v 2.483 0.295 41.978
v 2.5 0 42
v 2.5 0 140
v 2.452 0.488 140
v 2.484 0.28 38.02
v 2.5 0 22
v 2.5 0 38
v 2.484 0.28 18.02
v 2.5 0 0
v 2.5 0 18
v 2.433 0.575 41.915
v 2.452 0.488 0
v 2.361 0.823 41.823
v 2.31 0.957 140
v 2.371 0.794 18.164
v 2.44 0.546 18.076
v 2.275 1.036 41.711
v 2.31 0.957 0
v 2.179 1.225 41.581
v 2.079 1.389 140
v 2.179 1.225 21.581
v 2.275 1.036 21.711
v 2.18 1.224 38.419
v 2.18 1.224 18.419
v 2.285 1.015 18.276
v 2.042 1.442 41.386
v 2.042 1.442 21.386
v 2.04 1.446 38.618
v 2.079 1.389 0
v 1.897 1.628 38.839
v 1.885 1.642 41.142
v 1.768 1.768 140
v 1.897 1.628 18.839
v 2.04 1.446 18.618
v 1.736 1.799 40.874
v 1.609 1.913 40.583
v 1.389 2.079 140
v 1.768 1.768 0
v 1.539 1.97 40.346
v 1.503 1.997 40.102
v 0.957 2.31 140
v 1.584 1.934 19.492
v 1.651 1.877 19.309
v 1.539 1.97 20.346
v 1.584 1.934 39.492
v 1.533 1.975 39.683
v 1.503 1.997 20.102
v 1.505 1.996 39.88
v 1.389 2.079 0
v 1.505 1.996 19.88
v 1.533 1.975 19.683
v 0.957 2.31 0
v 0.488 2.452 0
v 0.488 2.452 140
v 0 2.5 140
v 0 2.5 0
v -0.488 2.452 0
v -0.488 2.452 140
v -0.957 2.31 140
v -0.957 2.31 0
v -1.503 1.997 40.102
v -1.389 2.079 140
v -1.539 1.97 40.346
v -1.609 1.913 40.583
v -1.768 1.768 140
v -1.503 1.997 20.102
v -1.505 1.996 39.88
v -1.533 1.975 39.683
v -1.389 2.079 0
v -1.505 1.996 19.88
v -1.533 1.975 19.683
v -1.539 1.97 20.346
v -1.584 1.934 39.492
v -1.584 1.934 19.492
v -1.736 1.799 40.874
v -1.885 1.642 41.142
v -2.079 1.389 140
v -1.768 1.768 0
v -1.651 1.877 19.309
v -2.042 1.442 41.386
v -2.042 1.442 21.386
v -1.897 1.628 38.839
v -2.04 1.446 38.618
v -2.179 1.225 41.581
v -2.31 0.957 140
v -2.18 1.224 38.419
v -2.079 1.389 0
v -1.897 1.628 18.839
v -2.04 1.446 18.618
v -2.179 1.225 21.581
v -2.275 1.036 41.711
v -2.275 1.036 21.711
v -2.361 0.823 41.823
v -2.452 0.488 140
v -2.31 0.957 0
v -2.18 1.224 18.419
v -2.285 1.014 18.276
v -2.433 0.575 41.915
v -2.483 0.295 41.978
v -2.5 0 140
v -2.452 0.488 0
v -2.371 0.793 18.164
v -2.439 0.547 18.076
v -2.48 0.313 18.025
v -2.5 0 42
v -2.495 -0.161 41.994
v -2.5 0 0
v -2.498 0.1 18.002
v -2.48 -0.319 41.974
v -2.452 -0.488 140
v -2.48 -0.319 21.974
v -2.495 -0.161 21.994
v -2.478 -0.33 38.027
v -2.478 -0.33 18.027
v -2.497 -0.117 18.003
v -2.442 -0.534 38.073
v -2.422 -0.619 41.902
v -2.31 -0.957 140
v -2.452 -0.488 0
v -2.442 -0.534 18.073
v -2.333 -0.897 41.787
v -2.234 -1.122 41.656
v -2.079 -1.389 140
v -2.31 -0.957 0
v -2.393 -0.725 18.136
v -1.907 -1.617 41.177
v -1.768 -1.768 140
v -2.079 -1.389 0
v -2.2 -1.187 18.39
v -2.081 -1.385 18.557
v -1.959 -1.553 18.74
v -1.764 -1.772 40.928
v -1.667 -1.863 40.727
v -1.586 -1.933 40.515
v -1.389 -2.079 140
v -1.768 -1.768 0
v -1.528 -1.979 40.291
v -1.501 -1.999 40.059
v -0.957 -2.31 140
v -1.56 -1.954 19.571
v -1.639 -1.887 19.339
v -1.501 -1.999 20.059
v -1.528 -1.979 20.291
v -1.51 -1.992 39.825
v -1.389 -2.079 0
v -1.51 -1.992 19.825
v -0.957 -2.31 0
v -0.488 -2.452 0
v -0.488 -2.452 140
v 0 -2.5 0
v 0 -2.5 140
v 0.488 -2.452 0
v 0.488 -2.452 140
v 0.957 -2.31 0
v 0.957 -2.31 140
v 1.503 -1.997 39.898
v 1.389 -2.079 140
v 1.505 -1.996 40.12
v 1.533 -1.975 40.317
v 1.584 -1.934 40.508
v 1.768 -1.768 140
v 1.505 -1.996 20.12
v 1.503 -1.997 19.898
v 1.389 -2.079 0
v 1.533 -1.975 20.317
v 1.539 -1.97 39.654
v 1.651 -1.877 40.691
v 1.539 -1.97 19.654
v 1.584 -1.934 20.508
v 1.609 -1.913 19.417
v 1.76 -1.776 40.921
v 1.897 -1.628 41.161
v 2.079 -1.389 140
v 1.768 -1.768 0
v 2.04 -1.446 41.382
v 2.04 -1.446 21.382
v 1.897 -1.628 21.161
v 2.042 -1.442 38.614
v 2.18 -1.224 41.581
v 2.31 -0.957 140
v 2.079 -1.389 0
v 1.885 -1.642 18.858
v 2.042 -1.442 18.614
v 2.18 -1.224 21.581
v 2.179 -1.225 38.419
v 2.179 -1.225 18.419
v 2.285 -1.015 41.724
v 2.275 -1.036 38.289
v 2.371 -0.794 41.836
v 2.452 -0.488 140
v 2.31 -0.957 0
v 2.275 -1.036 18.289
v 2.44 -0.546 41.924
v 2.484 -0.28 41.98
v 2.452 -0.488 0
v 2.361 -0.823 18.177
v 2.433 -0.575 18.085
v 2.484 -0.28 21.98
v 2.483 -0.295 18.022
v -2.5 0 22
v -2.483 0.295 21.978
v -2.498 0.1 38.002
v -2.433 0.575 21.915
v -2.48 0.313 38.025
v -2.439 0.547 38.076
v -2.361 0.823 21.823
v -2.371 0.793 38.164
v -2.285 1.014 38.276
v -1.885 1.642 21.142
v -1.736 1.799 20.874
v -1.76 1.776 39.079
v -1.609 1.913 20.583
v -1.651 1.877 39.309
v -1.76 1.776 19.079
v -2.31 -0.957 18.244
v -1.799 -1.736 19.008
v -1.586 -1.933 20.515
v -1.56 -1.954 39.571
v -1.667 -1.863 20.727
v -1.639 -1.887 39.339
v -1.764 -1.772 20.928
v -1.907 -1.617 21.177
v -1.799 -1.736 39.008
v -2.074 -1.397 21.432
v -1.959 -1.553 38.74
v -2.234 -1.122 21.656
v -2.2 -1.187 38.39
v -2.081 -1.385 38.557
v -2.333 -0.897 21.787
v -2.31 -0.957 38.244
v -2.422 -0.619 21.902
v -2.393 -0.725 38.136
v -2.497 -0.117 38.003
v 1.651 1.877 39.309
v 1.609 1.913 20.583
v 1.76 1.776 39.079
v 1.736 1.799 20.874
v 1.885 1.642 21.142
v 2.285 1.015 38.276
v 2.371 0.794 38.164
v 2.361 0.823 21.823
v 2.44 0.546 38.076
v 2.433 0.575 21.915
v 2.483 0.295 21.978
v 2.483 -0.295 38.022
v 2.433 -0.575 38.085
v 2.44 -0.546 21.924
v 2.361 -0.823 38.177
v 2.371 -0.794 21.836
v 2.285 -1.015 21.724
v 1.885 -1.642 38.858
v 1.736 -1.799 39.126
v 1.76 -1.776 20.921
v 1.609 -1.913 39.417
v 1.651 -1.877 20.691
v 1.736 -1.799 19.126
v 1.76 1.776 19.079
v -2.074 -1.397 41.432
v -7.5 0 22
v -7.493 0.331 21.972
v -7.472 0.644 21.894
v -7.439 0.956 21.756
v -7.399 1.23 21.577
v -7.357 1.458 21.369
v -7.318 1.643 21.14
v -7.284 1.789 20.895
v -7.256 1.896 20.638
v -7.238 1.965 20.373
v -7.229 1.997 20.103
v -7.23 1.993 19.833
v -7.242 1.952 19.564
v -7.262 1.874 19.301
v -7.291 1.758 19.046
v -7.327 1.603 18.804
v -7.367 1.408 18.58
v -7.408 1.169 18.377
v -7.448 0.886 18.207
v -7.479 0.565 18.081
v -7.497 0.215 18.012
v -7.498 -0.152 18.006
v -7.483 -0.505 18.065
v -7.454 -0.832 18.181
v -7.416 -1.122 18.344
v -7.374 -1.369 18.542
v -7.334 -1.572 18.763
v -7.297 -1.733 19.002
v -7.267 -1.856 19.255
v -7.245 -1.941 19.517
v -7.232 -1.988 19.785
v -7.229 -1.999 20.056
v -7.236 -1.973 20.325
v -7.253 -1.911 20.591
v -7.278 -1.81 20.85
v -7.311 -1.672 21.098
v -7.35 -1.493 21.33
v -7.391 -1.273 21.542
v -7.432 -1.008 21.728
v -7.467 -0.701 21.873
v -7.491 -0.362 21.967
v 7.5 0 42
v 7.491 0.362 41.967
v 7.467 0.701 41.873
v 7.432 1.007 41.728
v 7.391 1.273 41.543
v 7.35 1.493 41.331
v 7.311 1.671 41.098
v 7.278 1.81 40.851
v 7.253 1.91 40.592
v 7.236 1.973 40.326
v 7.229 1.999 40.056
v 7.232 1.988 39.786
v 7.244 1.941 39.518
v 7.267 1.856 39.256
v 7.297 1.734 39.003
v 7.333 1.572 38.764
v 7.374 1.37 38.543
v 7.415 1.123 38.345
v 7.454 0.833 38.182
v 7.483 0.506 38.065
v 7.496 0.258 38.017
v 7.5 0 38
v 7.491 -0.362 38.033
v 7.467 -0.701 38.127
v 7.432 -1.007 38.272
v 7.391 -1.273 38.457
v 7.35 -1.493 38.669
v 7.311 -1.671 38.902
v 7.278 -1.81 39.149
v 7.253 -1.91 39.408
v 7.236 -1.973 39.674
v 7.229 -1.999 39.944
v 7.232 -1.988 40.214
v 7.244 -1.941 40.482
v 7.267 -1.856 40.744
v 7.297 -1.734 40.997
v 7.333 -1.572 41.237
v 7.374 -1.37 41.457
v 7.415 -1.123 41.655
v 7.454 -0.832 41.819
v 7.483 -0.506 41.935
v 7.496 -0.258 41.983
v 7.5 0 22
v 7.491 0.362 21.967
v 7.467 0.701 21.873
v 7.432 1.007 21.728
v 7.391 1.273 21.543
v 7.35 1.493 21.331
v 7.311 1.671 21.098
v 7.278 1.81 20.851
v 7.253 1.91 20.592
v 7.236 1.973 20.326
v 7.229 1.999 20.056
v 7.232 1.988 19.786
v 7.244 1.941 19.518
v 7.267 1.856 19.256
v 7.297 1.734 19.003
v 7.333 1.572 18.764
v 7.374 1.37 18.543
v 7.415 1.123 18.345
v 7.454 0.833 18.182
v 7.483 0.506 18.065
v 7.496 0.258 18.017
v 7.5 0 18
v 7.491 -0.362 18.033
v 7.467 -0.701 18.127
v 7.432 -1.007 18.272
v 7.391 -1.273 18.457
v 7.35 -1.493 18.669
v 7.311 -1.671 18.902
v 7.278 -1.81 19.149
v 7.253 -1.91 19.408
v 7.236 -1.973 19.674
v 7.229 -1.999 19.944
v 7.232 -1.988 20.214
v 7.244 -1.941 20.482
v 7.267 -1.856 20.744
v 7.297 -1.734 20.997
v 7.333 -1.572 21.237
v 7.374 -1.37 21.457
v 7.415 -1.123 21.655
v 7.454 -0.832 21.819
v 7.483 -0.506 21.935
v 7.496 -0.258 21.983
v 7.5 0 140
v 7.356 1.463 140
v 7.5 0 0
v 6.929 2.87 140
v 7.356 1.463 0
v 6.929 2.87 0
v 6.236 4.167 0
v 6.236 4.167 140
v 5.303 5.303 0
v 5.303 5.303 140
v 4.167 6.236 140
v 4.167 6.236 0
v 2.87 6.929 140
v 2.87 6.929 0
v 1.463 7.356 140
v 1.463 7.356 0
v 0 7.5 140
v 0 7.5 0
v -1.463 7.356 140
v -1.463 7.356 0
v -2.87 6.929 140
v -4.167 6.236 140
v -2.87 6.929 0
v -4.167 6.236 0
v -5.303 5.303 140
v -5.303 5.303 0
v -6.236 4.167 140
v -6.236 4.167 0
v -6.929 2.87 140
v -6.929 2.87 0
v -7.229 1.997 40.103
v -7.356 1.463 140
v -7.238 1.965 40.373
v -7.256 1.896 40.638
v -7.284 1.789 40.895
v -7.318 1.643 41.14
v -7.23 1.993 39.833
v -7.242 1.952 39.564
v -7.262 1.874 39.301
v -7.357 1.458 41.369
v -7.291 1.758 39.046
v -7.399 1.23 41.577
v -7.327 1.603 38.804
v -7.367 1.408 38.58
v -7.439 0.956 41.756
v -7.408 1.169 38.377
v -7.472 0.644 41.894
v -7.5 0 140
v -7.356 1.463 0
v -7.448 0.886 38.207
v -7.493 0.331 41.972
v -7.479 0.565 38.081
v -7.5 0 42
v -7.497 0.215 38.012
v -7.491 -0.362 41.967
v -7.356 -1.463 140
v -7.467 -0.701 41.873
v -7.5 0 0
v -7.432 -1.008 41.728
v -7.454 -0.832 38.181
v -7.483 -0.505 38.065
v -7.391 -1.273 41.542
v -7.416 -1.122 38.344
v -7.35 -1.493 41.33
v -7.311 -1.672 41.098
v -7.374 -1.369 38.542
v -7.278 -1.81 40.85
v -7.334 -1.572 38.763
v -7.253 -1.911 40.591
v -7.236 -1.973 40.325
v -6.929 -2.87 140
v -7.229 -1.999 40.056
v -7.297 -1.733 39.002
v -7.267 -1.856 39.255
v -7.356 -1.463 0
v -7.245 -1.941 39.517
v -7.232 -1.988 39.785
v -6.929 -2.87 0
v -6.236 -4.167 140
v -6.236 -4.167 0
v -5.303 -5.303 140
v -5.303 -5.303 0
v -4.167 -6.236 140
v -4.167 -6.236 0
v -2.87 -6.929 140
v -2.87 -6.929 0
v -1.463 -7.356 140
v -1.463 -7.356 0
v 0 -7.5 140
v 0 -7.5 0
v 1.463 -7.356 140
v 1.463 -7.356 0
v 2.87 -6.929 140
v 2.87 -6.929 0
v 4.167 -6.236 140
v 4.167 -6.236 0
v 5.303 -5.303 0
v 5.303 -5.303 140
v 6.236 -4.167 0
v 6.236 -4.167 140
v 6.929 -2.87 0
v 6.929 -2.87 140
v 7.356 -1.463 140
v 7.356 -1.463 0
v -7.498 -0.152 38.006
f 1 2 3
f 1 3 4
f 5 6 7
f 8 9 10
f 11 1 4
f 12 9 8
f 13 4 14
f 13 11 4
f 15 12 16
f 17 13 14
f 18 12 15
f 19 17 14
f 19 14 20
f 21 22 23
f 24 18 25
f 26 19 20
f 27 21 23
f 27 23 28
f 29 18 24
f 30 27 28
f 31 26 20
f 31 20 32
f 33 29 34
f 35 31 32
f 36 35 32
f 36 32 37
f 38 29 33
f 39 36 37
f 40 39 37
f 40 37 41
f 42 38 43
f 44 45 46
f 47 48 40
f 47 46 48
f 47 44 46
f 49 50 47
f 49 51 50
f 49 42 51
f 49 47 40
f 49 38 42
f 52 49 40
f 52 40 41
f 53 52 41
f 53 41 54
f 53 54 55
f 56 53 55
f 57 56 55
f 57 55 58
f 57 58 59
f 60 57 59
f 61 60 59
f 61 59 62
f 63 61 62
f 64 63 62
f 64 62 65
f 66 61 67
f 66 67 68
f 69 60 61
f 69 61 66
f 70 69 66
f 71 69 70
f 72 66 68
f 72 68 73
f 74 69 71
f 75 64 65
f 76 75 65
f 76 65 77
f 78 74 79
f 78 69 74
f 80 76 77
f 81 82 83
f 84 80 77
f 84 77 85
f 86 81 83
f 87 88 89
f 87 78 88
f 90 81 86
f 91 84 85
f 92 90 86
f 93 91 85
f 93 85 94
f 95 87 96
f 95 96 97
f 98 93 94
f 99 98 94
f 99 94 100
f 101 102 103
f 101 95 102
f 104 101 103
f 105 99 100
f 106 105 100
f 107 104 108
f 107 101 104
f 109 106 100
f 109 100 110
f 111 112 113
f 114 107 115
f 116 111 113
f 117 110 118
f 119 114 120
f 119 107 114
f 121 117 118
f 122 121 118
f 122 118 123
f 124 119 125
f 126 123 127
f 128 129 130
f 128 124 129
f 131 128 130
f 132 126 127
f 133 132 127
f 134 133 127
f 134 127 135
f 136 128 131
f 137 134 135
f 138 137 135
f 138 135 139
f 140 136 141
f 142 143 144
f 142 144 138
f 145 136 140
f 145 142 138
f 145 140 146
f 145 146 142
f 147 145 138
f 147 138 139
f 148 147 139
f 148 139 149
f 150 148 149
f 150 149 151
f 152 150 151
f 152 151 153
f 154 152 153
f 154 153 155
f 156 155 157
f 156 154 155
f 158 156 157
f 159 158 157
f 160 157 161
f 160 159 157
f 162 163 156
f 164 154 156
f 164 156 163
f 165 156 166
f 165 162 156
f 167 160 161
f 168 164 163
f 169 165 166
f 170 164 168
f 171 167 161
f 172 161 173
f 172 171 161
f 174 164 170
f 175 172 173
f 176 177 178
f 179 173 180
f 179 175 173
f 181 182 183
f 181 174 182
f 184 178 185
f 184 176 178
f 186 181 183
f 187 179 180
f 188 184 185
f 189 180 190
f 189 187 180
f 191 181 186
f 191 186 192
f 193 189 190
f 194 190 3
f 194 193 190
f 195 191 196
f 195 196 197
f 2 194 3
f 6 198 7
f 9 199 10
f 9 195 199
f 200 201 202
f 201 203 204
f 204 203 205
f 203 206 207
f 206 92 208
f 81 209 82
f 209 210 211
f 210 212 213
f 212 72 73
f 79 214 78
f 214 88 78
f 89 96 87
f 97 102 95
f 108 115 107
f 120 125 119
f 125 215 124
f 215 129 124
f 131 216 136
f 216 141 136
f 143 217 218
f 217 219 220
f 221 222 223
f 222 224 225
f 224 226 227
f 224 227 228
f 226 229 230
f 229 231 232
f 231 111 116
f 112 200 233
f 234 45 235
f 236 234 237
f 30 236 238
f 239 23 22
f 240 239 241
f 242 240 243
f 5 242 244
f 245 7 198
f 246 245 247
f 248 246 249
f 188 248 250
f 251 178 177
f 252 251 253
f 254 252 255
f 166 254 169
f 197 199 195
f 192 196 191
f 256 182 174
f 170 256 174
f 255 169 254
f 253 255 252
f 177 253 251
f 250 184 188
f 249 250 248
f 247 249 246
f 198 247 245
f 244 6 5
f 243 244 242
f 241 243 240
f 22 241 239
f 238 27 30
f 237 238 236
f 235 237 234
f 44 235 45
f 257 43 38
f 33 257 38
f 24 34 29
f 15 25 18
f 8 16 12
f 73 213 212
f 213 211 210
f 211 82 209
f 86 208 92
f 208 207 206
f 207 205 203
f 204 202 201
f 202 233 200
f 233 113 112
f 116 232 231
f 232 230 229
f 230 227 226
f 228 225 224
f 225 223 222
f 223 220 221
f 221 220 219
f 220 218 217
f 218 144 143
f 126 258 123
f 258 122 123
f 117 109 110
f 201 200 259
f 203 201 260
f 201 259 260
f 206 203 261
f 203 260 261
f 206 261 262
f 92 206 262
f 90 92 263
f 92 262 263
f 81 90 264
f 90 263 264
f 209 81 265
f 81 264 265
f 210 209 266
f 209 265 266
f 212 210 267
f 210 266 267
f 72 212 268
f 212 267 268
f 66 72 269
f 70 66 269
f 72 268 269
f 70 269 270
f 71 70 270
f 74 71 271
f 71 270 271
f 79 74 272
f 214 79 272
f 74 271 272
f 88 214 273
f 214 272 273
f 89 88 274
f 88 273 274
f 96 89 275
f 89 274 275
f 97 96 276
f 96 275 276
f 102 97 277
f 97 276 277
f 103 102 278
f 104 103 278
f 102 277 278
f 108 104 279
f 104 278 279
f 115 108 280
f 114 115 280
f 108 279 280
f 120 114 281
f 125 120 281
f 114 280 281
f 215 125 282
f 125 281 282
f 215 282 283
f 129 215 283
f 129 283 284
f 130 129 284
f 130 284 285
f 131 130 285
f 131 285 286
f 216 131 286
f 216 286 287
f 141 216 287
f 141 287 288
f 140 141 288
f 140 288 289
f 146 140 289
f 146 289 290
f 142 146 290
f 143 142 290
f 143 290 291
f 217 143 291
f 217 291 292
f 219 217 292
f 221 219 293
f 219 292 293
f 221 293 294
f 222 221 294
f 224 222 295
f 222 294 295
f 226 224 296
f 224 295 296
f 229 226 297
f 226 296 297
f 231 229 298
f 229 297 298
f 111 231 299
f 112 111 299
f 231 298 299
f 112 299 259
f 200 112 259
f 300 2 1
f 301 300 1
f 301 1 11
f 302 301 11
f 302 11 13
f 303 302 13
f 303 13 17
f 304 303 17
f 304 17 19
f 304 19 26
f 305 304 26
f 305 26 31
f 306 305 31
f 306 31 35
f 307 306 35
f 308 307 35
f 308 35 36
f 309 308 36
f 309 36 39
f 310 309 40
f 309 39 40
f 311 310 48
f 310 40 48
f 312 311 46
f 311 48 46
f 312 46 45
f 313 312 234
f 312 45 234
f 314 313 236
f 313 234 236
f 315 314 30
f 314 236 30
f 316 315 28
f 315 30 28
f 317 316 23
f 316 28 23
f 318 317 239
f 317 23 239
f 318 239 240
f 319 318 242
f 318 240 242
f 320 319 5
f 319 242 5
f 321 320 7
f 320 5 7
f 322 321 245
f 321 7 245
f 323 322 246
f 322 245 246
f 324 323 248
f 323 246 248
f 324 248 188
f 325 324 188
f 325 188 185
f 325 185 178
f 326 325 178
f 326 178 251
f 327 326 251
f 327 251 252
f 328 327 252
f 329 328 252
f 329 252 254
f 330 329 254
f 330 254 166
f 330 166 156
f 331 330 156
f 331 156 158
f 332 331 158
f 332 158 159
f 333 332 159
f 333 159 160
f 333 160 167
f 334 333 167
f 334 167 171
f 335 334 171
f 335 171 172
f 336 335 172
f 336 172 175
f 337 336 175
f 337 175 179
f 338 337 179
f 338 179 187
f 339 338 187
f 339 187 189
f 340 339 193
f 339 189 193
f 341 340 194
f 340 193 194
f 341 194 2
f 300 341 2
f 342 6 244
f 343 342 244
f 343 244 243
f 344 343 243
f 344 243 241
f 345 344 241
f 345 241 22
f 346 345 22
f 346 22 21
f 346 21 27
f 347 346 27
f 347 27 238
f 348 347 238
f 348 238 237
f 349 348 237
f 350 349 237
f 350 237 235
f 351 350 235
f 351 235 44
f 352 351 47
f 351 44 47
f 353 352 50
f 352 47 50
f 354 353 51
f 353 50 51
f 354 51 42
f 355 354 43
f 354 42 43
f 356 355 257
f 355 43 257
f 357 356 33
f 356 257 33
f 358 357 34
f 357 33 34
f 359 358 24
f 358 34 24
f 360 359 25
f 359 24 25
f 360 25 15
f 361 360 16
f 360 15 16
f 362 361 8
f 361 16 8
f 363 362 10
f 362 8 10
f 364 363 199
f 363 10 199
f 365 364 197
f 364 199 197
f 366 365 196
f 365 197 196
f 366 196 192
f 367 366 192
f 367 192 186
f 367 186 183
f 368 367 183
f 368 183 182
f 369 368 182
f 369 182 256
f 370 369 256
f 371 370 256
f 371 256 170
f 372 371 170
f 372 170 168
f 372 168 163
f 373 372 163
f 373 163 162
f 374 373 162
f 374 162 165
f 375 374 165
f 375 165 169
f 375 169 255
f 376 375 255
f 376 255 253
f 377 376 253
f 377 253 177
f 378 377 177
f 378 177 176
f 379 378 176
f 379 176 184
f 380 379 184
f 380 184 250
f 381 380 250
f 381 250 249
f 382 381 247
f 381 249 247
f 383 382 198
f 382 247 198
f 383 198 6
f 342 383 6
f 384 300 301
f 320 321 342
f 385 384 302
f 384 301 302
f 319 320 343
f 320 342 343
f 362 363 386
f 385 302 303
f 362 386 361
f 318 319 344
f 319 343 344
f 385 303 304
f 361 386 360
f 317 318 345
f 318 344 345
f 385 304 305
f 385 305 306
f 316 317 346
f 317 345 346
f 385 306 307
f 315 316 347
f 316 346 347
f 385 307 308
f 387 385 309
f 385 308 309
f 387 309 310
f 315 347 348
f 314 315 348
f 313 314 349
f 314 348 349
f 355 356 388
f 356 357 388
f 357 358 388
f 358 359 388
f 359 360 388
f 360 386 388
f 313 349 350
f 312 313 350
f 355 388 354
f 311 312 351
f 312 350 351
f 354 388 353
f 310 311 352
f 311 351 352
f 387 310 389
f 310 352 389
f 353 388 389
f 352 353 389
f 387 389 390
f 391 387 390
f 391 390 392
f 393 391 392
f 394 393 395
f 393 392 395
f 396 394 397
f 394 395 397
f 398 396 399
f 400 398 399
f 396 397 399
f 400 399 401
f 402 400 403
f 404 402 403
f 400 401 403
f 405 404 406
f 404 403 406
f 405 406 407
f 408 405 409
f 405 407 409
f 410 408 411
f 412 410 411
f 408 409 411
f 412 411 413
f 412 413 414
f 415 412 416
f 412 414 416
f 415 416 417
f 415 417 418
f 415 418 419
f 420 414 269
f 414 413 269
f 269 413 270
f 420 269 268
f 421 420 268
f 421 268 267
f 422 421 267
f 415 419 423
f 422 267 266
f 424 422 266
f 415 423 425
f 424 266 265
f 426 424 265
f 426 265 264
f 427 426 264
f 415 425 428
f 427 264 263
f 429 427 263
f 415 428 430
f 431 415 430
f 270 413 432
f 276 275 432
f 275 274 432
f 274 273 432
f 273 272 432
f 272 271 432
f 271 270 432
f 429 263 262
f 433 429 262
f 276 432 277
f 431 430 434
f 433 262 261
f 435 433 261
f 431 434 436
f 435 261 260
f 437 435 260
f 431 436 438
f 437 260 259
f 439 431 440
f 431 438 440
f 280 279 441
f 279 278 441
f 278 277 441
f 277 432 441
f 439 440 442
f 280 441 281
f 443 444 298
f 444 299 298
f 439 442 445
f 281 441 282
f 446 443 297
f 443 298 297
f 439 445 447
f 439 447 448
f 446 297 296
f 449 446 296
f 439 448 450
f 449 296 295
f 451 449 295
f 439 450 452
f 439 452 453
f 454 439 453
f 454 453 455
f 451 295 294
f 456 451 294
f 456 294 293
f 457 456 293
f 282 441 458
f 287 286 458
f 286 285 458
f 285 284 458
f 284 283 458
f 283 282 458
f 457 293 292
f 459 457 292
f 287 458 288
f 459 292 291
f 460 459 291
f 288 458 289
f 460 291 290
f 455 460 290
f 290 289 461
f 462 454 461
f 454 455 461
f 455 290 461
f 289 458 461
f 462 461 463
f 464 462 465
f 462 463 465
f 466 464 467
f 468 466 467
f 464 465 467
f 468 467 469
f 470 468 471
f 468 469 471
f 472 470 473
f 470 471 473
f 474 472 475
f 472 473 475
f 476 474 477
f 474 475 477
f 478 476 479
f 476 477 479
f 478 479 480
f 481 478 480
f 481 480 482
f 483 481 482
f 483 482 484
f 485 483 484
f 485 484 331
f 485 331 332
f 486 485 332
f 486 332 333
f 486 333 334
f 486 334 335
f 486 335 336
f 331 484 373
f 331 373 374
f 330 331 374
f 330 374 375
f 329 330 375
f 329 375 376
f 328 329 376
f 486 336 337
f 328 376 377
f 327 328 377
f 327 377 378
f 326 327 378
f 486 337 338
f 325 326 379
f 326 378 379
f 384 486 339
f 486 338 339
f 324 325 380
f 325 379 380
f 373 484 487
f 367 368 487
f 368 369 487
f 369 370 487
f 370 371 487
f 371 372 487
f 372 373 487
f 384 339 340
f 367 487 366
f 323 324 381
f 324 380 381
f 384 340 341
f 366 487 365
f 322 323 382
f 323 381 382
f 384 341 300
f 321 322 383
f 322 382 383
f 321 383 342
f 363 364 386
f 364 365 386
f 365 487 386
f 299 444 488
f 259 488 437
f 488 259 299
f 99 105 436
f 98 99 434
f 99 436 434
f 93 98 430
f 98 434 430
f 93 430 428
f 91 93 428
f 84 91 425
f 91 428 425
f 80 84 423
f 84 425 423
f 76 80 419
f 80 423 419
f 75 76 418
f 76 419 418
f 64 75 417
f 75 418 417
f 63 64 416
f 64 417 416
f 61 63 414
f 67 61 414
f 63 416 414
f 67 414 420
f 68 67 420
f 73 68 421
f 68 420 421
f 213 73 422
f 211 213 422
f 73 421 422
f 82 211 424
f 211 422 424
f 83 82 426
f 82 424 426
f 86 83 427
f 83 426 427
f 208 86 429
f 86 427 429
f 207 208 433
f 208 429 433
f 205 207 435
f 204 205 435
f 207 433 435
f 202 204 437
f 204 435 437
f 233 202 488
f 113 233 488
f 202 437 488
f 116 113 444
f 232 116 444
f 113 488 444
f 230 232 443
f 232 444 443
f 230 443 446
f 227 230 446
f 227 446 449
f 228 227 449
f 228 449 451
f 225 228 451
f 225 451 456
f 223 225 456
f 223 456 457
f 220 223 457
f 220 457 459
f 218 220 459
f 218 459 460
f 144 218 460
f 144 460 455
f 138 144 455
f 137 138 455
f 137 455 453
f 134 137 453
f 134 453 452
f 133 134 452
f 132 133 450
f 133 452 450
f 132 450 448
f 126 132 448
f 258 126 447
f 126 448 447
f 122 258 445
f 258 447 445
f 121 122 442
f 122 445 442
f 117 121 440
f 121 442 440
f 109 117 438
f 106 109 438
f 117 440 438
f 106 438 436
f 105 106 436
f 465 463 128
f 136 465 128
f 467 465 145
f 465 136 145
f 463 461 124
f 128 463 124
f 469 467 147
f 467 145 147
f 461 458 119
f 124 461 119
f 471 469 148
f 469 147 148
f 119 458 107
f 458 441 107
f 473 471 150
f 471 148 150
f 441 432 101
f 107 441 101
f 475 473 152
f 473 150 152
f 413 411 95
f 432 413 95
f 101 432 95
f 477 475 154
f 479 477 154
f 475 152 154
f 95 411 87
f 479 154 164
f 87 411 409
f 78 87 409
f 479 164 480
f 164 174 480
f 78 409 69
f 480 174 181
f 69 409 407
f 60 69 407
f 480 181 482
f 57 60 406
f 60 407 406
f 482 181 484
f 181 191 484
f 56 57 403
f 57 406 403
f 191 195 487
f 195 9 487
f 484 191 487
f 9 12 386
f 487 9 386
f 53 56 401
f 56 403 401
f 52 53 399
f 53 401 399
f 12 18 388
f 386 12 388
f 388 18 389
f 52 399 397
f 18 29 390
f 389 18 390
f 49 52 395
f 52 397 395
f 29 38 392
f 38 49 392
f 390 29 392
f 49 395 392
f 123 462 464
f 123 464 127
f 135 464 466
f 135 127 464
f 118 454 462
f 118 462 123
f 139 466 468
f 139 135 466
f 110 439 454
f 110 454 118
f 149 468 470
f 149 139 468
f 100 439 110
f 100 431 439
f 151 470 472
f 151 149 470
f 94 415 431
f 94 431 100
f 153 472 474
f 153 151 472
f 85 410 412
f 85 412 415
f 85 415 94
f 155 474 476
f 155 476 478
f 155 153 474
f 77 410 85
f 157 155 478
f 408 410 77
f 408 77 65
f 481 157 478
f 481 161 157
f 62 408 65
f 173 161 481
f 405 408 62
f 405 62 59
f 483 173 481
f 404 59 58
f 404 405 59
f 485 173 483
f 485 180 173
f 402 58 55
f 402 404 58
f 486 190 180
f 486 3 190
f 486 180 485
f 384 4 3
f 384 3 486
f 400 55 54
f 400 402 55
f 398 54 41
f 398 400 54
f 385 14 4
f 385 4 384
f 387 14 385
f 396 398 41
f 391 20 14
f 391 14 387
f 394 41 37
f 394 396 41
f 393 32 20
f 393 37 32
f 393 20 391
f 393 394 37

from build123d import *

# Parameters (mm, degrees)
SKETCH1_R           = 7.5
SKETCH1_R_2         = 2.5
BOSS_EXTRUDE1_DEPTH = 140
SKETCH2_R           = 2
CUT_EXTRUDE1_DEPTH  = 16


with BuildPart() as part:
    # Sketch1 → Boss-Extrude1 (new body)
    with BuildSketch(Plane.XY):
        Circle(SKETCH1_R)
        Circle(SKETCH1_R_2, mode=Mode.SUBTRACT)
    extrude(amount=BOSS_EXTRUDE1_DEPTH)

    # Sketch2 → Cut-Extrude1 (cut)
    with BuildSketch(Plane.ZY.offset(7.5)):
        with Locations((20, 0)):
            Circle(SKETCH2_R)
        with Locations((40, 0)):
            Circle(SKETCH2_R)
    extrude(amount=-CUT_EXTRUDE1_DEPTH, mode=Mode.SUBTRACT)


solid = part.part
